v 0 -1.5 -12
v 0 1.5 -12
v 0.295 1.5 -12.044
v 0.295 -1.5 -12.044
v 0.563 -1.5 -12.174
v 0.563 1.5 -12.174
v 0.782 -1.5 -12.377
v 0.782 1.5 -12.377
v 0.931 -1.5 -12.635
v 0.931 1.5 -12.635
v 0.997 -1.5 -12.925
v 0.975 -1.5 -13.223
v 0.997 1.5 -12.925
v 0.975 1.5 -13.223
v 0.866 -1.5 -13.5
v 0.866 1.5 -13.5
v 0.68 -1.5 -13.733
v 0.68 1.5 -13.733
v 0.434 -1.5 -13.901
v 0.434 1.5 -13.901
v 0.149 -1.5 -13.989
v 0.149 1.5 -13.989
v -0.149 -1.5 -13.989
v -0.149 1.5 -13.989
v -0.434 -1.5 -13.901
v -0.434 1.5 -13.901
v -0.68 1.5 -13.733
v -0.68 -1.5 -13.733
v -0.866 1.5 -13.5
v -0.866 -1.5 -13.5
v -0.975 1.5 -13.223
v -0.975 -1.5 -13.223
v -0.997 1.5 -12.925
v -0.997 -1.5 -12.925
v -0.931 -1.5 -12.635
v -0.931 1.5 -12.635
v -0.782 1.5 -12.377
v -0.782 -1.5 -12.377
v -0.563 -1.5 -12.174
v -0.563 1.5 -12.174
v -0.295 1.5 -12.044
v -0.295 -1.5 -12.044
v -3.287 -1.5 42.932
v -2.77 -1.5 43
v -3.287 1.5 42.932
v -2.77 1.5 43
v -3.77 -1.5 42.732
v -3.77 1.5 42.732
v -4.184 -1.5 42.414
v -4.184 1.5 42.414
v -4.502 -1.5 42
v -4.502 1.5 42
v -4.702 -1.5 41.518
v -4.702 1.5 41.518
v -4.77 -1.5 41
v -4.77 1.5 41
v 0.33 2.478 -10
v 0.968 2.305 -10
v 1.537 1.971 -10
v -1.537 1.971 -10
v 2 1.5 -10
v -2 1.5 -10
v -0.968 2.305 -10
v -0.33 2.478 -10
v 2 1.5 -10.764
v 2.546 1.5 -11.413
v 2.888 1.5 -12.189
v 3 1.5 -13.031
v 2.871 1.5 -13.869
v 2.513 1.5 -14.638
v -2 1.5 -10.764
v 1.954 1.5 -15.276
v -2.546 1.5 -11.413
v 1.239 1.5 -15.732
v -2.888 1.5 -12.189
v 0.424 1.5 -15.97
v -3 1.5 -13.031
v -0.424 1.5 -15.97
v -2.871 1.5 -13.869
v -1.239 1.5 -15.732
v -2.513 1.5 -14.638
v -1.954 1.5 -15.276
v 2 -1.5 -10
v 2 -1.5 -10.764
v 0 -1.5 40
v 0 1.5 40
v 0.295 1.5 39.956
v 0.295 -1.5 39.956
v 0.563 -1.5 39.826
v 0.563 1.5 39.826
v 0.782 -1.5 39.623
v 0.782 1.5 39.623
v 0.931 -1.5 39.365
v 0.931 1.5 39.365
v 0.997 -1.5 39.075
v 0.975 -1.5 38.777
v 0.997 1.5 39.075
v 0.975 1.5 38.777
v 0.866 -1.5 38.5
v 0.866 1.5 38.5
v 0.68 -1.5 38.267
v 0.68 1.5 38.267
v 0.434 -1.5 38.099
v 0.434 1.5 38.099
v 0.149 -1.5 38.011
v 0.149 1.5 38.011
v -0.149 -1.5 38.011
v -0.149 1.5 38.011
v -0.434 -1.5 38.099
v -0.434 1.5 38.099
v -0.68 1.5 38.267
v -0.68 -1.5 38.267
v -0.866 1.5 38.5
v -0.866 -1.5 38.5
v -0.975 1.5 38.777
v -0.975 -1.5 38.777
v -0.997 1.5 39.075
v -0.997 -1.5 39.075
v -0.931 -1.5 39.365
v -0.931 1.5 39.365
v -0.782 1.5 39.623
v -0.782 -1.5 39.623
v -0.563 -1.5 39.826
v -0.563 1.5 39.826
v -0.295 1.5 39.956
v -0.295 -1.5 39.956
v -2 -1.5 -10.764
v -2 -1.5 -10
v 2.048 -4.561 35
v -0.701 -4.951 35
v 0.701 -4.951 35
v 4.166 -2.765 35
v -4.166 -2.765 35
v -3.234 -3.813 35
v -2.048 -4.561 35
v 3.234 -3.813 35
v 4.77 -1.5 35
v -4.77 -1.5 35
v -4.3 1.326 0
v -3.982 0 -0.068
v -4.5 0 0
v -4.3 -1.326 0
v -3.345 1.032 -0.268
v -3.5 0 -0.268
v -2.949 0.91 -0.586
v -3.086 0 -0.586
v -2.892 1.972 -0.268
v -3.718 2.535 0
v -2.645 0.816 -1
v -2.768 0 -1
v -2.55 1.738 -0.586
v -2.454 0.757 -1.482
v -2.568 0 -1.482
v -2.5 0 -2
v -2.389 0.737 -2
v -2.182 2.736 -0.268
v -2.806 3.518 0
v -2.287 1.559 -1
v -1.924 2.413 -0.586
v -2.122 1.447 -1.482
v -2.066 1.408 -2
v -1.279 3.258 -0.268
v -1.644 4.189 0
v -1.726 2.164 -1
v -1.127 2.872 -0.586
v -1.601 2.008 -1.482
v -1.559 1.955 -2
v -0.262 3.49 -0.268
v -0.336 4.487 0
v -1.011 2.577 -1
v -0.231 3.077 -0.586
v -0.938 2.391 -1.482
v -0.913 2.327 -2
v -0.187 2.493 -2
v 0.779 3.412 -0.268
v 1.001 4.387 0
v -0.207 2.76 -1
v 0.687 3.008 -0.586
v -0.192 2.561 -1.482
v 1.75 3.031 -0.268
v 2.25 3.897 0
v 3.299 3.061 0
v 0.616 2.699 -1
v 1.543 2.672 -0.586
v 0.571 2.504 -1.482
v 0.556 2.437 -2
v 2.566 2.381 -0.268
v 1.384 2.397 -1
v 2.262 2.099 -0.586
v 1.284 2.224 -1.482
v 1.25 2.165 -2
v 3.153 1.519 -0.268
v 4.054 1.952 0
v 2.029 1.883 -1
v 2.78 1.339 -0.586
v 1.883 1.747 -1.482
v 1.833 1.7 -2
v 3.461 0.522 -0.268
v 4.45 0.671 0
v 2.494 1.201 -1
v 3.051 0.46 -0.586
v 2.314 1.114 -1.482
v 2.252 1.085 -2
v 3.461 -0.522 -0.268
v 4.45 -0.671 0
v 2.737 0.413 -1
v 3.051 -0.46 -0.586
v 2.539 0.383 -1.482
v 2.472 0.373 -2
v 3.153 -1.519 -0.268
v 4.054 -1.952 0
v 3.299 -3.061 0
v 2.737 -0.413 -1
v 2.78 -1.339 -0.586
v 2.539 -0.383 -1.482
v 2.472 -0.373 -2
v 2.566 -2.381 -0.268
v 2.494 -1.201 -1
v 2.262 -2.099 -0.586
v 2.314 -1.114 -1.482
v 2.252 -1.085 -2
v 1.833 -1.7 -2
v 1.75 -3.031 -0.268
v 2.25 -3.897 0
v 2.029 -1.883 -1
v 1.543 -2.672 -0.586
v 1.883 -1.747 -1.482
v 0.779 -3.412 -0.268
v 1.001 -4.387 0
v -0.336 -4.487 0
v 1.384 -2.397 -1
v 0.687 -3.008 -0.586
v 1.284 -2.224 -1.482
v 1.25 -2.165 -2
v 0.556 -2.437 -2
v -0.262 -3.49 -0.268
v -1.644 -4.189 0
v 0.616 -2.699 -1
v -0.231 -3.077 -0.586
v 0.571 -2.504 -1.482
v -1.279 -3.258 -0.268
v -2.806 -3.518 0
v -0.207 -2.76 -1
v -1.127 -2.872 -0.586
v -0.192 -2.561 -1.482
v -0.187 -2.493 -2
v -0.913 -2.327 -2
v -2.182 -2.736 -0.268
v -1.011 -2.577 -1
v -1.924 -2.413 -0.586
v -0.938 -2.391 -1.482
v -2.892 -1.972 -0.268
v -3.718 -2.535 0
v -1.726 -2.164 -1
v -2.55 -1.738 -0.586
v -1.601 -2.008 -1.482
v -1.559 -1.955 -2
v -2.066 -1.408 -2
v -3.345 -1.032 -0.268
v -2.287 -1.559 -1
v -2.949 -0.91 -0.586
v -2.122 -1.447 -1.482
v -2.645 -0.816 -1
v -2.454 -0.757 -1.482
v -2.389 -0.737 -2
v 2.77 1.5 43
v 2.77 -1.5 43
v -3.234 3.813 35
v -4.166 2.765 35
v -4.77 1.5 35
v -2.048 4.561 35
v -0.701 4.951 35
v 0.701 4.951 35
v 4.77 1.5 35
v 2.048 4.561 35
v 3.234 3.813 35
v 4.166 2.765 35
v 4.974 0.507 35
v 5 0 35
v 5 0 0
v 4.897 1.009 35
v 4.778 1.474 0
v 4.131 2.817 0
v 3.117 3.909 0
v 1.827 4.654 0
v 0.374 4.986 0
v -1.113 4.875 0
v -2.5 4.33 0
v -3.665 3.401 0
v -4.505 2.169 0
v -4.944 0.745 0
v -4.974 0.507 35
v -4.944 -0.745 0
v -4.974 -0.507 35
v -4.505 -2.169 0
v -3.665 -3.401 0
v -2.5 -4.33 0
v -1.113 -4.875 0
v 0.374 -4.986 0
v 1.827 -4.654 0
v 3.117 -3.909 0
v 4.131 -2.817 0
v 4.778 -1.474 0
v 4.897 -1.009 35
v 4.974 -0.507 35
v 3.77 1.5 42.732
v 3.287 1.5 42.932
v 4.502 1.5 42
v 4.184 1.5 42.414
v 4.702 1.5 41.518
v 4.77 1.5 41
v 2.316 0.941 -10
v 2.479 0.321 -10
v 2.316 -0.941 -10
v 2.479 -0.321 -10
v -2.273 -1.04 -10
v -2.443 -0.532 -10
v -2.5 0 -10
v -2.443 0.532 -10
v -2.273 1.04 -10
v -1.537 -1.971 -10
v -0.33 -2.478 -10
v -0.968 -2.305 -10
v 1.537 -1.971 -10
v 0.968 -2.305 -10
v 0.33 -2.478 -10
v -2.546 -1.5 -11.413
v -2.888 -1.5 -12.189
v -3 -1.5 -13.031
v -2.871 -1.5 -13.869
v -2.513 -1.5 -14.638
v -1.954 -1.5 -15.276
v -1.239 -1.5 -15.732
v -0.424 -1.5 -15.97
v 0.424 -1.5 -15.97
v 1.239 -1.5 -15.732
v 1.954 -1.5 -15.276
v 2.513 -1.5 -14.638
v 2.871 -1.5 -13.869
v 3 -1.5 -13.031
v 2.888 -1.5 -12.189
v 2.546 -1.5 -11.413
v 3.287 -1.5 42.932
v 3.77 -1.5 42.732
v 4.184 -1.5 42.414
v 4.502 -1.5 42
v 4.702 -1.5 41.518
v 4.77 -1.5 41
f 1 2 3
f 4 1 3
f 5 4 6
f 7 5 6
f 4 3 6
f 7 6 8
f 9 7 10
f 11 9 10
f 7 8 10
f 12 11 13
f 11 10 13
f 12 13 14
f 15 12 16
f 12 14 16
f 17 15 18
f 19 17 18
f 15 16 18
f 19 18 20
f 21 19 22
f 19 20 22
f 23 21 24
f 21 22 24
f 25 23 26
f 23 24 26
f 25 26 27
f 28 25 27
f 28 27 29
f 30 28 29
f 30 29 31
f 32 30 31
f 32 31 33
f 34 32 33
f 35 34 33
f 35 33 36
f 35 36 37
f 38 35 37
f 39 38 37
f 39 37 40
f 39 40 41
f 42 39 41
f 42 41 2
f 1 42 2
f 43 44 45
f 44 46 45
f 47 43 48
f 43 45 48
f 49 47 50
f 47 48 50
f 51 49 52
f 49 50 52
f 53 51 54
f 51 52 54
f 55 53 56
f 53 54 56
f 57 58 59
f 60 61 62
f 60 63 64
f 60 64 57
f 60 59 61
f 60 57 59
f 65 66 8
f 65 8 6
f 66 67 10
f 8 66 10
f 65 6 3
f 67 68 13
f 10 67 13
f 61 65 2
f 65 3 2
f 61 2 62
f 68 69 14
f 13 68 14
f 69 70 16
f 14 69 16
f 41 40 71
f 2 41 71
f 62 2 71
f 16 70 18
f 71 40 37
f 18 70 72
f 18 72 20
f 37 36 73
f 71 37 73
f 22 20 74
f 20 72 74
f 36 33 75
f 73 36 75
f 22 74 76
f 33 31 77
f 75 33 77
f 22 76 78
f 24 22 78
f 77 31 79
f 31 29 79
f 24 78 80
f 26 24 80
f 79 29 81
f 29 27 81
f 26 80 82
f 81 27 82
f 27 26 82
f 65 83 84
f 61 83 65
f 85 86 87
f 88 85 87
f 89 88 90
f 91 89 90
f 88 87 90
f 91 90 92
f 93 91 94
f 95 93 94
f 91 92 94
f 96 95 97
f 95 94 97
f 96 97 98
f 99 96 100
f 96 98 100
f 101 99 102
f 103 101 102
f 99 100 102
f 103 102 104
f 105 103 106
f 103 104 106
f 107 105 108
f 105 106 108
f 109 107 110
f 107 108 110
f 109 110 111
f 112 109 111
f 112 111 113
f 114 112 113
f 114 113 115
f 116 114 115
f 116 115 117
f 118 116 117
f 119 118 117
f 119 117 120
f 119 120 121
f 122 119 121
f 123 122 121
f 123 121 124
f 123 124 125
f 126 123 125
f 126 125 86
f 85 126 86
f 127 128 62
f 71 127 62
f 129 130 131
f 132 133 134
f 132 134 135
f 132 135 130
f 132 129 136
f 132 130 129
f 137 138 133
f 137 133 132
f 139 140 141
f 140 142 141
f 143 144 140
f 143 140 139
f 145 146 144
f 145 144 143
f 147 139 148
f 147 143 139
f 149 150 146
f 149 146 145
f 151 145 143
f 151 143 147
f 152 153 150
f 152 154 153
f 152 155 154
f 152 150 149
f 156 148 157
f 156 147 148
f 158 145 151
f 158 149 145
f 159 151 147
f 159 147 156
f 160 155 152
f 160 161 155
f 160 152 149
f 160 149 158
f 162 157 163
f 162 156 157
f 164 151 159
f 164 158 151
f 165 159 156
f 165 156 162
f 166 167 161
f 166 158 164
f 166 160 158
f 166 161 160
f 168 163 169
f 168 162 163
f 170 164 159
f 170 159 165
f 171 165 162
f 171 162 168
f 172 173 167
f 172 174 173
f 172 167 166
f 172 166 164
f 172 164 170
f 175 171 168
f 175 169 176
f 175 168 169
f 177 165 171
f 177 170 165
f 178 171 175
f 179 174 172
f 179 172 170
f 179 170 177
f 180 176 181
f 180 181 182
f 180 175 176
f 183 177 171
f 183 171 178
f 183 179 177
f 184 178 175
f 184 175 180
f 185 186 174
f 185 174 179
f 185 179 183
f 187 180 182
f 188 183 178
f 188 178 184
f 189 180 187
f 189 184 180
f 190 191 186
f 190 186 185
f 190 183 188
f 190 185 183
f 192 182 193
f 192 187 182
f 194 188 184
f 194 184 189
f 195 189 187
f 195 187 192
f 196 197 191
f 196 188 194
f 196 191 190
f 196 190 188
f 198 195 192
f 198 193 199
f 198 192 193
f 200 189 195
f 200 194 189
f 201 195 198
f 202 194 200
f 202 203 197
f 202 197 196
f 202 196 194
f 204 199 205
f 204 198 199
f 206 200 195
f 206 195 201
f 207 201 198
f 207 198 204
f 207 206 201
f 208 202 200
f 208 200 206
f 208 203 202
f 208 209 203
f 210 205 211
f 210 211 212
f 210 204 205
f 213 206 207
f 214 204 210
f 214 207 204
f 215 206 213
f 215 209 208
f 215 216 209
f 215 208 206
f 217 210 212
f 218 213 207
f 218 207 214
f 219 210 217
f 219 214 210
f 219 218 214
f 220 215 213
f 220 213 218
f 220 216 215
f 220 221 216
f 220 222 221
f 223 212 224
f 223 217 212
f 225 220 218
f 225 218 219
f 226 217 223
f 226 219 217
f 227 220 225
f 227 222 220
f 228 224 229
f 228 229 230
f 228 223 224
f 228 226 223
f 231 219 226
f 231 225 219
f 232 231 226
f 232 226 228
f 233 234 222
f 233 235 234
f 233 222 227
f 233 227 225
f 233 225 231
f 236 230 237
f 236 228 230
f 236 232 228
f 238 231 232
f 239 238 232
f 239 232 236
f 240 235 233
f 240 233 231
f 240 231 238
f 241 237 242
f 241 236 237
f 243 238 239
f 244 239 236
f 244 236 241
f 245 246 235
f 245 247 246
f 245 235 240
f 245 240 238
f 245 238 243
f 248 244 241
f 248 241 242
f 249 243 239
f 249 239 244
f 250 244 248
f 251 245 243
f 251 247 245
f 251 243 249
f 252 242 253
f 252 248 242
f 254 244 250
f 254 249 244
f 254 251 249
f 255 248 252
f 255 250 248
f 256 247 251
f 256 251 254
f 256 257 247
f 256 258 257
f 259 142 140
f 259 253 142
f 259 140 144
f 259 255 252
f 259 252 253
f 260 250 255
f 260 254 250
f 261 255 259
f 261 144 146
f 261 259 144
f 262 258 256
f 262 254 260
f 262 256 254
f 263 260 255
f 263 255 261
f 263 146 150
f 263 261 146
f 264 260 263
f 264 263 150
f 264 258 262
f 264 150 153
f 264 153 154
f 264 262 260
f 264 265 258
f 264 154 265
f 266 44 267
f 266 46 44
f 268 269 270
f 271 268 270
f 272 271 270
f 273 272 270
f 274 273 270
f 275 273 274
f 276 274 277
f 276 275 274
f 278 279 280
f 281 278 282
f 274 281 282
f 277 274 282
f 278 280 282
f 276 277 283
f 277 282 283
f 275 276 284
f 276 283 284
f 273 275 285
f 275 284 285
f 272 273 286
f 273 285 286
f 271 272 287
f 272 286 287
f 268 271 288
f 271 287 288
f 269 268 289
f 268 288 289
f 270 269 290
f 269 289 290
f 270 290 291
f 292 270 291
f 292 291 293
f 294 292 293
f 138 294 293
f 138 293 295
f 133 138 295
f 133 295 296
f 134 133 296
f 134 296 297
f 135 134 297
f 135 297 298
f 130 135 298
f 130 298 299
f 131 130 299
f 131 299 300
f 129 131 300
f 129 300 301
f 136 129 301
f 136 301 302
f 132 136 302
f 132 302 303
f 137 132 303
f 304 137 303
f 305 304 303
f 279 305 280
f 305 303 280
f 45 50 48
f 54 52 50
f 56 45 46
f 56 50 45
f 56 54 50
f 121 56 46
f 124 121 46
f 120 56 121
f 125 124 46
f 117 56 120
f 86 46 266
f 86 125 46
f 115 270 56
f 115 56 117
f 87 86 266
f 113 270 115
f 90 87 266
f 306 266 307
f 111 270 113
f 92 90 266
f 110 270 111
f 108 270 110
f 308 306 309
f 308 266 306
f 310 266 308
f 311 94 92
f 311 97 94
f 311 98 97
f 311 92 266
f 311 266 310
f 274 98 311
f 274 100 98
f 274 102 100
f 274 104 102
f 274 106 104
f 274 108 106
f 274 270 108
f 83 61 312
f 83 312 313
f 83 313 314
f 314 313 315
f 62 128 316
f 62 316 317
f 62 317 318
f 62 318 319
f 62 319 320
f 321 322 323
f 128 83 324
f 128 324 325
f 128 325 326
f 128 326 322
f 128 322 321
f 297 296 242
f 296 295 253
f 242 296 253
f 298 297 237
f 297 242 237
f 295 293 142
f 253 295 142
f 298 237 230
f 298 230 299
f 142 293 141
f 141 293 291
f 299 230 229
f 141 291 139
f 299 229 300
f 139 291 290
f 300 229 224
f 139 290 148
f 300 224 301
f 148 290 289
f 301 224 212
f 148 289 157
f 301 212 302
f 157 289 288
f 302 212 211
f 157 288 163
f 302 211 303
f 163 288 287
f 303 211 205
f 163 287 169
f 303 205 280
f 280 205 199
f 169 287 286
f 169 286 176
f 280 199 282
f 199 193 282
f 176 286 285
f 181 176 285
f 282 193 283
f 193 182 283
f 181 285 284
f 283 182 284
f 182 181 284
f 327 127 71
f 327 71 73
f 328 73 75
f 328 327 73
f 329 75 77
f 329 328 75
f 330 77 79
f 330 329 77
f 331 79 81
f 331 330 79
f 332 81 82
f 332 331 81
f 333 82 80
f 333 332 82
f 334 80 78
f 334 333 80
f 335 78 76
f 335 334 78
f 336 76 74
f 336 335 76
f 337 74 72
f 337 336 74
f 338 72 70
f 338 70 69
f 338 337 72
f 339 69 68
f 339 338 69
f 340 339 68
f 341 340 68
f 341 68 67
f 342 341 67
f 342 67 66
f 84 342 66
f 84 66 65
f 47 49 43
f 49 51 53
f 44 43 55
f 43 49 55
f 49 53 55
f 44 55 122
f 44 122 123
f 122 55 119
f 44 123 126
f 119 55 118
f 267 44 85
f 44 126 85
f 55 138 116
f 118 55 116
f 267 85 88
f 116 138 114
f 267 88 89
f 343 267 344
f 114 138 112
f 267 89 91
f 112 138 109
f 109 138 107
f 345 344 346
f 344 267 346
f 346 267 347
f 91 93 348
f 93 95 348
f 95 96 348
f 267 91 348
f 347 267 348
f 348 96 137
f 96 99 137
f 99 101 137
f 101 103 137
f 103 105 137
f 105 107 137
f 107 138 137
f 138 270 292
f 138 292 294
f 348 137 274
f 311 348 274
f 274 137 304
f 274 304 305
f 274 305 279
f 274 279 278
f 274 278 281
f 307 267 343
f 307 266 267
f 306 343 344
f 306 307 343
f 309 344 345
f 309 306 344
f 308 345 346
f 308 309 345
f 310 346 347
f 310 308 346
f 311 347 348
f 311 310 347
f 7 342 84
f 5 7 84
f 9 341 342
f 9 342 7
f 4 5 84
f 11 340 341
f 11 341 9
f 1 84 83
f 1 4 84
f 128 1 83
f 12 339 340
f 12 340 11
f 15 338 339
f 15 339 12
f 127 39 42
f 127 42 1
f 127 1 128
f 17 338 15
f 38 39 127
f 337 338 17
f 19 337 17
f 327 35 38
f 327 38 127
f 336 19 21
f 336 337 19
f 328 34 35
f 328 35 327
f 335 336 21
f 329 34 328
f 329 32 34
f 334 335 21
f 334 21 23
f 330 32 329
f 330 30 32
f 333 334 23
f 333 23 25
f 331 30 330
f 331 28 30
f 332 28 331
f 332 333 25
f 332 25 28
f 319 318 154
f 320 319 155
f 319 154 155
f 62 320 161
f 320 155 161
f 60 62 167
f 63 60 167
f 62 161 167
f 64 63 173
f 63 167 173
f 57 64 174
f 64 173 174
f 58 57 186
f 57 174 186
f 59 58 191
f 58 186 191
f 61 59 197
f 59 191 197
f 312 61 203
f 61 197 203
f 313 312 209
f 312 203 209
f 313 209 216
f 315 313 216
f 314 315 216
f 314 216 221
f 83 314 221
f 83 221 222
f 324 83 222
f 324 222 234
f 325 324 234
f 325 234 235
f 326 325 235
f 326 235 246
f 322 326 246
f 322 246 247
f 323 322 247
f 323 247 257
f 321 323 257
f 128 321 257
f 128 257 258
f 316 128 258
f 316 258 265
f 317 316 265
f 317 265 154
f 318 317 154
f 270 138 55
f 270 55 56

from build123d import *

# Parameters (mm, degrees)
SKETCH1_R           = 5
BOSS_EXTRUDE1_DEPTH = 35
SKETCH2_W           = 9.539392014
SKETCH2_H           = 3
BOSS_EXTRUDE2_DEPTH = 8
SKETCH3_R           = 2.5
BOSS_EXTRUDE3_DEPTH = 10
SKETCH4_W           = 4
SKETCH4_H           = 3
BOSS_EXTRUDE4_DEPTH = 3
SKETCH5_R           = 3
BOSS_EXTRUDE5_DEPTH = 3
FILLET1_R           = 2
FILLET4_R           = 2
SKETCH6_R           = 1
CUT_EXTRUDE1_DEPTH  = 44.774992861
SKETCH7_R           = 1
CUT_EXTRUDE2_DEPTH  = 44.774992861


with BuildPart() as part:
    # Sketch1 → Boss-Extrude1 (new body)
    with BuildSketch(Plane.XY):
        Circle(SKETCH1_R)
    extrude(amount=BOSS_EXTRUDE1_DEPTH)

    # Sketch2 → Boss-Extrude2 (add)
    with BuildSketch(Plane.XY.offset(35)):
        Rectangle(SKETCH2_W, SKETCH2_H)
    extrude(amount=BOSS_EXTRUDE2_DEPTH)

    # Sketch3 → Boss-Extrude3 (add)
    with BuildSketch(Plane(origin=(0, 0, 0), x_dir=(-1, 0, 0), z_dir=(0, 0, -1))):
        Circle(SKETCH3_R)
    extrude(amount=BOSS_EXTRUDE3_DEPTH)

    # Sketch4 → Boss-Extrude4 (add)
    with BuildSketch(Plane(origin=(0, 0, -10), x_dir=(-1, 0, 0), z_dir=(0, 0, -1))):
        Rectangle(SKETCH4_W, SKETCH4_H)
    extrude(amount=BOSS_EXTRUDE4_DEPTH)

    # Sketch5 → Boss-Extrude5 (add)
    with BuildSketch(Plane(origin=(0, -1.5, 0), x_dir=(-1, 0, 0), z_dir=(0, -1, 0))):
        with Locations((0, 13)):
            Circle(SKETCH5_R)
    extrude(amount=-BOSS_EXTRUDE5_DEPTH)

    # Fillet1
    fillet1_edges = [part.edges().sort_by_distance(p)[0] for p in [
        (4.769696007, 0, 43),
        (-4.769696007, 0, 43),
    ]]
    fillet(fillet1_edges, radius=FILLET1_R)

    # Fillet4
    fillet4_edges = [part.edges().sort_by_distance(p)[0] for p in [
        (2.5, 0, 0),
    ]]
    fillet(fillet4_edges, radius=FILLET4_R)

    # Sketch6 → Cut-Extrude1 (cut, through all)
    with BuildSketch(Plane(origin=(0, 1.5, 0), x_dir=(1, 0, 0), z_dir=(0, 1, 0))):
        with Locations(Location((0, 13, 0), (0, 0, 270))):
            Circle(SKETCH6_R)
    extrude(amount=-CUT_EXTRUDE1_DEPTH, mode=Mode.SUBTRACT)

    # Sketch7 → Cut-Extrude2 (cut, through all)
    with BuildSketch(Plane(origin=(0, 1.5, 0), x_dir=(1, 0, 0), z_dir=(0, 1, 0))):
        with Locations(Location((0, -39, 0), (0, 0, 270))):
            Circle(SKETCH7_R)
    extrude(amount=-CUT_EXTRUDE2_DEPTH, mode=Mode.SUBTRACT)


solid = part.part
